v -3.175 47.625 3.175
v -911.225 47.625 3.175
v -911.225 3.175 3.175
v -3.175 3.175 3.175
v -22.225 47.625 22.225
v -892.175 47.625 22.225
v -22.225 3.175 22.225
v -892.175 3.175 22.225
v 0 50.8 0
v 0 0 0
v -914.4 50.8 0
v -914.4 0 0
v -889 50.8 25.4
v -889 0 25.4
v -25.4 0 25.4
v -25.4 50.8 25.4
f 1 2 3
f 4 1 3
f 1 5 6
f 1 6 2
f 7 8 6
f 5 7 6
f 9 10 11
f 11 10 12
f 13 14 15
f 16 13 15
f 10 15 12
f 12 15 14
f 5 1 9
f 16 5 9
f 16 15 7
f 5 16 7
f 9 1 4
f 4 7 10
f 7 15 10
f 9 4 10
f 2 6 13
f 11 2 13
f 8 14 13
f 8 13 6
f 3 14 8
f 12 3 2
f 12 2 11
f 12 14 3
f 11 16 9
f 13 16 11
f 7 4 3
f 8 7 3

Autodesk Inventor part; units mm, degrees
ref_plane "YZ Plane" through (0, 0, 0) normal (1, 0, 0) x (0, 1, 0)
ref_plane "XZ Plane" through (0, 0, 0) normal (0, 1, 0) x (-1, 0, 0)
sketch "Sketch1" plane through (0, 0, 0) normal (0, 1, 0) x (-1, 0, 0)
  line L0 (0, 0) -> (914.4, 0)
  line L1 (914.4, 0) -> (914.4, 25.4)
  line L2 (914.4, 25.4) -> (889, 25.4)
  line L3 (889, 25.4) -> (914.4, 0)
  line L4 (889, 25.4) -> (25.4, 25.4)
  line L5 (25.4, 25.4) -> (0, 0)
  dimension "d0" = 914.4
  dimension "d1" = 25.4
  dimension "d2" = 25.4
  dimension "d3" = 863.6
extrude "Extrusion1" add sketch "Sketch1" along normal blind 50.8 contours L5 L4 L3 L0
ref_plane "Work Plane1" through (-457.2, 0, 457.2) normal (1, 0, 0) x (0, 1, 0)
sketch "Sketch2" plane through (-457.2, 0, 457.2) normal (1, 0, 0) x (0, 1, 0)
  line L0 (50.8, -457.2) -> (47.625, -457.2)
  line L1 (0, -457.2) -> (50.8, -457.2) projected
  line L2 (47.625, -457.2) -> (47.625, -454.025)
  line L3 (47.625, -454.025) -> (3.175, -454.025)
  line L4 (3.175, -454.025) -> (3.175, -434.975)
  line L5 (3.175, -434.975) -> (47.625, -434.975)
  line L6 (47.625, -434.975) -> (47.625, -454.025)
  dimension "d6" = 3.175
  dimension "d7" = 3.175
  dimension "d8" = 44.45
  dimension "d9" = 19.05
extrude "Extrusion2" cut sketch "Sketch2" along normal through all both and the other way through all
properties part number "36in 2x1 double corner"
